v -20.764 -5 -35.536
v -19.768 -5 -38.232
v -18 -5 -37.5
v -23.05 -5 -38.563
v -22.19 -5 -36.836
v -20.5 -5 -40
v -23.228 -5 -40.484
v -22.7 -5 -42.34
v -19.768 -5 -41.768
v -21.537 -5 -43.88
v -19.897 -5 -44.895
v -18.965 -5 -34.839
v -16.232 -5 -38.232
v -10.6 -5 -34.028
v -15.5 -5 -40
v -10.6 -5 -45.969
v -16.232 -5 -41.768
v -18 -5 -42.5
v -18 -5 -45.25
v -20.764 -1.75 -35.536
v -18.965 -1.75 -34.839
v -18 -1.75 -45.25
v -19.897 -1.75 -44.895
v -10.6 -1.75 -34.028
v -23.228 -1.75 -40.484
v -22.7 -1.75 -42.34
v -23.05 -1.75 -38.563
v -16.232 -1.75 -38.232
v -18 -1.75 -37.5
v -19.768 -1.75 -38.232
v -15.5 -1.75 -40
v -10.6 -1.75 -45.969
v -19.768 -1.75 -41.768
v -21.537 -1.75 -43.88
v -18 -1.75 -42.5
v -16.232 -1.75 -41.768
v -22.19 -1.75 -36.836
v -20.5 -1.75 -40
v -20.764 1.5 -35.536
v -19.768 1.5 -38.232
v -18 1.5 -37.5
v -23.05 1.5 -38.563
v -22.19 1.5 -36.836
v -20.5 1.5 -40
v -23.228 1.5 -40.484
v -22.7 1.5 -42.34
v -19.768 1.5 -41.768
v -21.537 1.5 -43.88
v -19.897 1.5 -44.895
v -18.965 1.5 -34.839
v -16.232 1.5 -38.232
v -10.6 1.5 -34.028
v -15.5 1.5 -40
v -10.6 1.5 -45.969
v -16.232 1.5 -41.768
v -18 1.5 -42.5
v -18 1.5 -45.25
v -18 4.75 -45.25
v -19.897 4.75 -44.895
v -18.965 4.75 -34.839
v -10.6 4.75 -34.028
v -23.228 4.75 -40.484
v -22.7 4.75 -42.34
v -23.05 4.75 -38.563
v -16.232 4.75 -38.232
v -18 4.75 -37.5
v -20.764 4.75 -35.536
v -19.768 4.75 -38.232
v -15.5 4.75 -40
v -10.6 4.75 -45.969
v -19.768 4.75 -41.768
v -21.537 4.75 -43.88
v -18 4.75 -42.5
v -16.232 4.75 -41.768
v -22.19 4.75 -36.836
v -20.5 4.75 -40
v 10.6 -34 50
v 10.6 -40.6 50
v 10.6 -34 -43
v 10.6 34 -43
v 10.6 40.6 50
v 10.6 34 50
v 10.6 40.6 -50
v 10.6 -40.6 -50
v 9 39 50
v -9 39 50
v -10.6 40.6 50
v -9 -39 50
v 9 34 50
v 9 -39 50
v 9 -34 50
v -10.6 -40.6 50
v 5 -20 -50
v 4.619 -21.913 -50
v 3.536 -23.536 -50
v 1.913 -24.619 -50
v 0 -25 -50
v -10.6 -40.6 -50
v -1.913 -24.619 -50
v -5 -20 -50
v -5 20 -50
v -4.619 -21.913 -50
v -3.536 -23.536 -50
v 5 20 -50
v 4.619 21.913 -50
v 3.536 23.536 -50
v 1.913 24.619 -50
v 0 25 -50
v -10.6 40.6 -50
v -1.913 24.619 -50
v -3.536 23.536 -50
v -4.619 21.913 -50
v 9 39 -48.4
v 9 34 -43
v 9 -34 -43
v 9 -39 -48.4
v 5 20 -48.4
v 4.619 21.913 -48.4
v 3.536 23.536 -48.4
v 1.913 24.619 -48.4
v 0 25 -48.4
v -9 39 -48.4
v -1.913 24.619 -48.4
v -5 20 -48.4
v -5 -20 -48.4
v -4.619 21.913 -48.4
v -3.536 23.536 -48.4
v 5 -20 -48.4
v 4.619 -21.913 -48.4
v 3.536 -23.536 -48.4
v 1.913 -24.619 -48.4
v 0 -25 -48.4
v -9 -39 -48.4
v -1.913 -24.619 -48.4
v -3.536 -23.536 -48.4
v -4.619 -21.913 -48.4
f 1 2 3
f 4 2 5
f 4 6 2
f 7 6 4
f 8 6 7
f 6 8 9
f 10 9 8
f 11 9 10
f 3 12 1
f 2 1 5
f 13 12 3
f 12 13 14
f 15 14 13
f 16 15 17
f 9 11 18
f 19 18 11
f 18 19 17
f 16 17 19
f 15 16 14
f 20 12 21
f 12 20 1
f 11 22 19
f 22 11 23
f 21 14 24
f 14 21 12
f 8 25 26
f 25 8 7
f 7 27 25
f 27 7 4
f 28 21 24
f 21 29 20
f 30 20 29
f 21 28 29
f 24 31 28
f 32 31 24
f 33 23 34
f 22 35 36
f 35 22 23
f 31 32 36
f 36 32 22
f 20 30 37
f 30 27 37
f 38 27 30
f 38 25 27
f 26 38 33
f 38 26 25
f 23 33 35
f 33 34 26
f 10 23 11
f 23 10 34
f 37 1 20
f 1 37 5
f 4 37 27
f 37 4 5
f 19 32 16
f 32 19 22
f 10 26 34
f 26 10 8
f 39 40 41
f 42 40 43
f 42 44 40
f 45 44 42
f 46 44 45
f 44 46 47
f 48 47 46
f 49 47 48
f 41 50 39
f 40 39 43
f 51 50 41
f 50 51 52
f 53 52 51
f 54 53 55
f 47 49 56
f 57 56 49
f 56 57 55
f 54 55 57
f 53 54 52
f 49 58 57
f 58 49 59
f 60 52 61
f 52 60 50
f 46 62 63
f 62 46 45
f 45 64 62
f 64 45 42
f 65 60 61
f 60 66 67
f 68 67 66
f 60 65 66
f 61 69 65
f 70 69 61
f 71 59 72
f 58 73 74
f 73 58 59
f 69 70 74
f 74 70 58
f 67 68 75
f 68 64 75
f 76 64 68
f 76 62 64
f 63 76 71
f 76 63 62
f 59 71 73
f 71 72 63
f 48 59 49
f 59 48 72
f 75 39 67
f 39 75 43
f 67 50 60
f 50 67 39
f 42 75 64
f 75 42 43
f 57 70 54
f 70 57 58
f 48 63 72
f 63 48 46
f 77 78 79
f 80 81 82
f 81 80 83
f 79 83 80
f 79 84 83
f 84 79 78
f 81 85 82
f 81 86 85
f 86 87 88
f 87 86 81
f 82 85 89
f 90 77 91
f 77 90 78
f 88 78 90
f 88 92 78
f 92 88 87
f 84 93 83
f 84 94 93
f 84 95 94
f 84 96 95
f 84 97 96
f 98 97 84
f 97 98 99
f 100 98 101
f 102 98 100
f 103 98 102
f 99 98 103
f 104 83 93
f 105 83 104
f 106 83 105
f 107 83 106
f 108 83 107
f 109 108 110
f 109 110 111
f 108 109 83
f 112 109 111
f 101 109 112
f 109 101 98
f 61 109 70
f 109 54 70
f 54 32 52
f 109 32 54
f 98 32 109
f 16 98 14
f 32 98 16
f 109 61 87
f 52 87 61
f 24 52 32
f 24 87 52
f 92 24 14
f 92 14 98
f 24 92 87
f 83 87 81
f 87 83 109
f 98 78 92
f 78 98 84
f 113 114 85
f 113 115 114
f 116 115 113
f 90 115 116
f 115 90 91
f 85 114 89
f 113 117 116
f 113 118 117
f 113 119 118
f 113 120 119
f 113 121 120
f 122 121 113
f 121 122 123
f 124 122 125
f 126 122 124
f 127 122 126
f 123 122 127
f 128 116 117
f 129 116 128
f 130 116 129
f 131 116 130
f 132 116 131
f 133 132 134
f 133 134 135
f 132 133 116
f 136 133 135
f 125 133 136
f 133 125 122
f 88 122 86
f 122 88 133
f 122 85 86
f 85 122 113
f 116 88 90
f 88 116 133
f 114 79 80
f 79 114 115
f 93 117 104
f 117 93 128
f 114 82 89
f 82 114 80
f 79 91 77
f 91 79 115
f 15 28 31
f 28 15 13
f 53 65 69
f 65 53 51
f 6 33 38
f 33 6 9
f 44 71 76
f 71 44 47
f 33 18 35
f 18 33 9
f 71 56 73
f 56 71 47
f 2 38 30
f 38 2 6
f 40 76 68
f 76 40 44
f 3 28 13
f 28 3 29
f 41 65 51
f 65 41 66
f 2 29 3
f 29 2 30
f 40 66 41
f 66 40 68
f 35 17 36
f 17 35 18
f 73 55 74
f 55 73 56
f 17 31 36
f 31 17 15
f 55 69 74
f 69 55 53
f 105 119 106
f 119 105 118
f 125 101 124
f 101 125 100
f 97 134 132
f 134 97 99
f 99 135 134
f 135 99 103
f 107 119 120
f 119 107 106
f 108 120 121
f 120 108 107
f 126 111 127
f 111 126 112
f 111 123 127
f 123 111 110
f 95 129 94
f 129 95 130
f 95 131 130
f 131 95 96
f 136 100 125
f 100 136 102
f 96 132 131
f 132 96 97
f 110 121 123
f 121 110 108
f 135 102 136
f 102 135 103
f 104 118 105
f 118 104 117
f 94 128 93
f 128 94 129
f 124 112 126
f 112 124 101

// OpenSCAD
profondeur = 18;
largeur = 78;
marge=5;
position_support=40;
difference(){
    union(){
        cube([profondeur+3.2,largeur+3.2,100],center=true);
        translate([0,0,-position_support]) rotate([0,0,90]) for( i=[0:6.5:10]){
             hull(){
               translate([-5+i,profondeur,0]) rotate([0,90,0]) cylinder(h=3.25,r=5.25); 
               translate([-5+i,0,0]) rotate([0,90,0]) cylinder(h=3.25,r=7);
             }
        }
    
    }
    union(){
        translate([0,0,1.6]) cube([profondeur,largeur,100],center=true);
        translate([profondeur/2,0,2+marge]) cube([profondeur-marge*2,largeur-marge*2,100],center=true);
        translate([-profondeur,0,-position_support]) rotate([0,90,90]) cylinder(h=100,r=2.5,center=true);
        hull(){
            translate([0,20,0]) cylinder(h=150,r=5,center=true);
            translate([0,-20,0]) cylinder(h=150,r=5,center=true);
        }
    }
}
